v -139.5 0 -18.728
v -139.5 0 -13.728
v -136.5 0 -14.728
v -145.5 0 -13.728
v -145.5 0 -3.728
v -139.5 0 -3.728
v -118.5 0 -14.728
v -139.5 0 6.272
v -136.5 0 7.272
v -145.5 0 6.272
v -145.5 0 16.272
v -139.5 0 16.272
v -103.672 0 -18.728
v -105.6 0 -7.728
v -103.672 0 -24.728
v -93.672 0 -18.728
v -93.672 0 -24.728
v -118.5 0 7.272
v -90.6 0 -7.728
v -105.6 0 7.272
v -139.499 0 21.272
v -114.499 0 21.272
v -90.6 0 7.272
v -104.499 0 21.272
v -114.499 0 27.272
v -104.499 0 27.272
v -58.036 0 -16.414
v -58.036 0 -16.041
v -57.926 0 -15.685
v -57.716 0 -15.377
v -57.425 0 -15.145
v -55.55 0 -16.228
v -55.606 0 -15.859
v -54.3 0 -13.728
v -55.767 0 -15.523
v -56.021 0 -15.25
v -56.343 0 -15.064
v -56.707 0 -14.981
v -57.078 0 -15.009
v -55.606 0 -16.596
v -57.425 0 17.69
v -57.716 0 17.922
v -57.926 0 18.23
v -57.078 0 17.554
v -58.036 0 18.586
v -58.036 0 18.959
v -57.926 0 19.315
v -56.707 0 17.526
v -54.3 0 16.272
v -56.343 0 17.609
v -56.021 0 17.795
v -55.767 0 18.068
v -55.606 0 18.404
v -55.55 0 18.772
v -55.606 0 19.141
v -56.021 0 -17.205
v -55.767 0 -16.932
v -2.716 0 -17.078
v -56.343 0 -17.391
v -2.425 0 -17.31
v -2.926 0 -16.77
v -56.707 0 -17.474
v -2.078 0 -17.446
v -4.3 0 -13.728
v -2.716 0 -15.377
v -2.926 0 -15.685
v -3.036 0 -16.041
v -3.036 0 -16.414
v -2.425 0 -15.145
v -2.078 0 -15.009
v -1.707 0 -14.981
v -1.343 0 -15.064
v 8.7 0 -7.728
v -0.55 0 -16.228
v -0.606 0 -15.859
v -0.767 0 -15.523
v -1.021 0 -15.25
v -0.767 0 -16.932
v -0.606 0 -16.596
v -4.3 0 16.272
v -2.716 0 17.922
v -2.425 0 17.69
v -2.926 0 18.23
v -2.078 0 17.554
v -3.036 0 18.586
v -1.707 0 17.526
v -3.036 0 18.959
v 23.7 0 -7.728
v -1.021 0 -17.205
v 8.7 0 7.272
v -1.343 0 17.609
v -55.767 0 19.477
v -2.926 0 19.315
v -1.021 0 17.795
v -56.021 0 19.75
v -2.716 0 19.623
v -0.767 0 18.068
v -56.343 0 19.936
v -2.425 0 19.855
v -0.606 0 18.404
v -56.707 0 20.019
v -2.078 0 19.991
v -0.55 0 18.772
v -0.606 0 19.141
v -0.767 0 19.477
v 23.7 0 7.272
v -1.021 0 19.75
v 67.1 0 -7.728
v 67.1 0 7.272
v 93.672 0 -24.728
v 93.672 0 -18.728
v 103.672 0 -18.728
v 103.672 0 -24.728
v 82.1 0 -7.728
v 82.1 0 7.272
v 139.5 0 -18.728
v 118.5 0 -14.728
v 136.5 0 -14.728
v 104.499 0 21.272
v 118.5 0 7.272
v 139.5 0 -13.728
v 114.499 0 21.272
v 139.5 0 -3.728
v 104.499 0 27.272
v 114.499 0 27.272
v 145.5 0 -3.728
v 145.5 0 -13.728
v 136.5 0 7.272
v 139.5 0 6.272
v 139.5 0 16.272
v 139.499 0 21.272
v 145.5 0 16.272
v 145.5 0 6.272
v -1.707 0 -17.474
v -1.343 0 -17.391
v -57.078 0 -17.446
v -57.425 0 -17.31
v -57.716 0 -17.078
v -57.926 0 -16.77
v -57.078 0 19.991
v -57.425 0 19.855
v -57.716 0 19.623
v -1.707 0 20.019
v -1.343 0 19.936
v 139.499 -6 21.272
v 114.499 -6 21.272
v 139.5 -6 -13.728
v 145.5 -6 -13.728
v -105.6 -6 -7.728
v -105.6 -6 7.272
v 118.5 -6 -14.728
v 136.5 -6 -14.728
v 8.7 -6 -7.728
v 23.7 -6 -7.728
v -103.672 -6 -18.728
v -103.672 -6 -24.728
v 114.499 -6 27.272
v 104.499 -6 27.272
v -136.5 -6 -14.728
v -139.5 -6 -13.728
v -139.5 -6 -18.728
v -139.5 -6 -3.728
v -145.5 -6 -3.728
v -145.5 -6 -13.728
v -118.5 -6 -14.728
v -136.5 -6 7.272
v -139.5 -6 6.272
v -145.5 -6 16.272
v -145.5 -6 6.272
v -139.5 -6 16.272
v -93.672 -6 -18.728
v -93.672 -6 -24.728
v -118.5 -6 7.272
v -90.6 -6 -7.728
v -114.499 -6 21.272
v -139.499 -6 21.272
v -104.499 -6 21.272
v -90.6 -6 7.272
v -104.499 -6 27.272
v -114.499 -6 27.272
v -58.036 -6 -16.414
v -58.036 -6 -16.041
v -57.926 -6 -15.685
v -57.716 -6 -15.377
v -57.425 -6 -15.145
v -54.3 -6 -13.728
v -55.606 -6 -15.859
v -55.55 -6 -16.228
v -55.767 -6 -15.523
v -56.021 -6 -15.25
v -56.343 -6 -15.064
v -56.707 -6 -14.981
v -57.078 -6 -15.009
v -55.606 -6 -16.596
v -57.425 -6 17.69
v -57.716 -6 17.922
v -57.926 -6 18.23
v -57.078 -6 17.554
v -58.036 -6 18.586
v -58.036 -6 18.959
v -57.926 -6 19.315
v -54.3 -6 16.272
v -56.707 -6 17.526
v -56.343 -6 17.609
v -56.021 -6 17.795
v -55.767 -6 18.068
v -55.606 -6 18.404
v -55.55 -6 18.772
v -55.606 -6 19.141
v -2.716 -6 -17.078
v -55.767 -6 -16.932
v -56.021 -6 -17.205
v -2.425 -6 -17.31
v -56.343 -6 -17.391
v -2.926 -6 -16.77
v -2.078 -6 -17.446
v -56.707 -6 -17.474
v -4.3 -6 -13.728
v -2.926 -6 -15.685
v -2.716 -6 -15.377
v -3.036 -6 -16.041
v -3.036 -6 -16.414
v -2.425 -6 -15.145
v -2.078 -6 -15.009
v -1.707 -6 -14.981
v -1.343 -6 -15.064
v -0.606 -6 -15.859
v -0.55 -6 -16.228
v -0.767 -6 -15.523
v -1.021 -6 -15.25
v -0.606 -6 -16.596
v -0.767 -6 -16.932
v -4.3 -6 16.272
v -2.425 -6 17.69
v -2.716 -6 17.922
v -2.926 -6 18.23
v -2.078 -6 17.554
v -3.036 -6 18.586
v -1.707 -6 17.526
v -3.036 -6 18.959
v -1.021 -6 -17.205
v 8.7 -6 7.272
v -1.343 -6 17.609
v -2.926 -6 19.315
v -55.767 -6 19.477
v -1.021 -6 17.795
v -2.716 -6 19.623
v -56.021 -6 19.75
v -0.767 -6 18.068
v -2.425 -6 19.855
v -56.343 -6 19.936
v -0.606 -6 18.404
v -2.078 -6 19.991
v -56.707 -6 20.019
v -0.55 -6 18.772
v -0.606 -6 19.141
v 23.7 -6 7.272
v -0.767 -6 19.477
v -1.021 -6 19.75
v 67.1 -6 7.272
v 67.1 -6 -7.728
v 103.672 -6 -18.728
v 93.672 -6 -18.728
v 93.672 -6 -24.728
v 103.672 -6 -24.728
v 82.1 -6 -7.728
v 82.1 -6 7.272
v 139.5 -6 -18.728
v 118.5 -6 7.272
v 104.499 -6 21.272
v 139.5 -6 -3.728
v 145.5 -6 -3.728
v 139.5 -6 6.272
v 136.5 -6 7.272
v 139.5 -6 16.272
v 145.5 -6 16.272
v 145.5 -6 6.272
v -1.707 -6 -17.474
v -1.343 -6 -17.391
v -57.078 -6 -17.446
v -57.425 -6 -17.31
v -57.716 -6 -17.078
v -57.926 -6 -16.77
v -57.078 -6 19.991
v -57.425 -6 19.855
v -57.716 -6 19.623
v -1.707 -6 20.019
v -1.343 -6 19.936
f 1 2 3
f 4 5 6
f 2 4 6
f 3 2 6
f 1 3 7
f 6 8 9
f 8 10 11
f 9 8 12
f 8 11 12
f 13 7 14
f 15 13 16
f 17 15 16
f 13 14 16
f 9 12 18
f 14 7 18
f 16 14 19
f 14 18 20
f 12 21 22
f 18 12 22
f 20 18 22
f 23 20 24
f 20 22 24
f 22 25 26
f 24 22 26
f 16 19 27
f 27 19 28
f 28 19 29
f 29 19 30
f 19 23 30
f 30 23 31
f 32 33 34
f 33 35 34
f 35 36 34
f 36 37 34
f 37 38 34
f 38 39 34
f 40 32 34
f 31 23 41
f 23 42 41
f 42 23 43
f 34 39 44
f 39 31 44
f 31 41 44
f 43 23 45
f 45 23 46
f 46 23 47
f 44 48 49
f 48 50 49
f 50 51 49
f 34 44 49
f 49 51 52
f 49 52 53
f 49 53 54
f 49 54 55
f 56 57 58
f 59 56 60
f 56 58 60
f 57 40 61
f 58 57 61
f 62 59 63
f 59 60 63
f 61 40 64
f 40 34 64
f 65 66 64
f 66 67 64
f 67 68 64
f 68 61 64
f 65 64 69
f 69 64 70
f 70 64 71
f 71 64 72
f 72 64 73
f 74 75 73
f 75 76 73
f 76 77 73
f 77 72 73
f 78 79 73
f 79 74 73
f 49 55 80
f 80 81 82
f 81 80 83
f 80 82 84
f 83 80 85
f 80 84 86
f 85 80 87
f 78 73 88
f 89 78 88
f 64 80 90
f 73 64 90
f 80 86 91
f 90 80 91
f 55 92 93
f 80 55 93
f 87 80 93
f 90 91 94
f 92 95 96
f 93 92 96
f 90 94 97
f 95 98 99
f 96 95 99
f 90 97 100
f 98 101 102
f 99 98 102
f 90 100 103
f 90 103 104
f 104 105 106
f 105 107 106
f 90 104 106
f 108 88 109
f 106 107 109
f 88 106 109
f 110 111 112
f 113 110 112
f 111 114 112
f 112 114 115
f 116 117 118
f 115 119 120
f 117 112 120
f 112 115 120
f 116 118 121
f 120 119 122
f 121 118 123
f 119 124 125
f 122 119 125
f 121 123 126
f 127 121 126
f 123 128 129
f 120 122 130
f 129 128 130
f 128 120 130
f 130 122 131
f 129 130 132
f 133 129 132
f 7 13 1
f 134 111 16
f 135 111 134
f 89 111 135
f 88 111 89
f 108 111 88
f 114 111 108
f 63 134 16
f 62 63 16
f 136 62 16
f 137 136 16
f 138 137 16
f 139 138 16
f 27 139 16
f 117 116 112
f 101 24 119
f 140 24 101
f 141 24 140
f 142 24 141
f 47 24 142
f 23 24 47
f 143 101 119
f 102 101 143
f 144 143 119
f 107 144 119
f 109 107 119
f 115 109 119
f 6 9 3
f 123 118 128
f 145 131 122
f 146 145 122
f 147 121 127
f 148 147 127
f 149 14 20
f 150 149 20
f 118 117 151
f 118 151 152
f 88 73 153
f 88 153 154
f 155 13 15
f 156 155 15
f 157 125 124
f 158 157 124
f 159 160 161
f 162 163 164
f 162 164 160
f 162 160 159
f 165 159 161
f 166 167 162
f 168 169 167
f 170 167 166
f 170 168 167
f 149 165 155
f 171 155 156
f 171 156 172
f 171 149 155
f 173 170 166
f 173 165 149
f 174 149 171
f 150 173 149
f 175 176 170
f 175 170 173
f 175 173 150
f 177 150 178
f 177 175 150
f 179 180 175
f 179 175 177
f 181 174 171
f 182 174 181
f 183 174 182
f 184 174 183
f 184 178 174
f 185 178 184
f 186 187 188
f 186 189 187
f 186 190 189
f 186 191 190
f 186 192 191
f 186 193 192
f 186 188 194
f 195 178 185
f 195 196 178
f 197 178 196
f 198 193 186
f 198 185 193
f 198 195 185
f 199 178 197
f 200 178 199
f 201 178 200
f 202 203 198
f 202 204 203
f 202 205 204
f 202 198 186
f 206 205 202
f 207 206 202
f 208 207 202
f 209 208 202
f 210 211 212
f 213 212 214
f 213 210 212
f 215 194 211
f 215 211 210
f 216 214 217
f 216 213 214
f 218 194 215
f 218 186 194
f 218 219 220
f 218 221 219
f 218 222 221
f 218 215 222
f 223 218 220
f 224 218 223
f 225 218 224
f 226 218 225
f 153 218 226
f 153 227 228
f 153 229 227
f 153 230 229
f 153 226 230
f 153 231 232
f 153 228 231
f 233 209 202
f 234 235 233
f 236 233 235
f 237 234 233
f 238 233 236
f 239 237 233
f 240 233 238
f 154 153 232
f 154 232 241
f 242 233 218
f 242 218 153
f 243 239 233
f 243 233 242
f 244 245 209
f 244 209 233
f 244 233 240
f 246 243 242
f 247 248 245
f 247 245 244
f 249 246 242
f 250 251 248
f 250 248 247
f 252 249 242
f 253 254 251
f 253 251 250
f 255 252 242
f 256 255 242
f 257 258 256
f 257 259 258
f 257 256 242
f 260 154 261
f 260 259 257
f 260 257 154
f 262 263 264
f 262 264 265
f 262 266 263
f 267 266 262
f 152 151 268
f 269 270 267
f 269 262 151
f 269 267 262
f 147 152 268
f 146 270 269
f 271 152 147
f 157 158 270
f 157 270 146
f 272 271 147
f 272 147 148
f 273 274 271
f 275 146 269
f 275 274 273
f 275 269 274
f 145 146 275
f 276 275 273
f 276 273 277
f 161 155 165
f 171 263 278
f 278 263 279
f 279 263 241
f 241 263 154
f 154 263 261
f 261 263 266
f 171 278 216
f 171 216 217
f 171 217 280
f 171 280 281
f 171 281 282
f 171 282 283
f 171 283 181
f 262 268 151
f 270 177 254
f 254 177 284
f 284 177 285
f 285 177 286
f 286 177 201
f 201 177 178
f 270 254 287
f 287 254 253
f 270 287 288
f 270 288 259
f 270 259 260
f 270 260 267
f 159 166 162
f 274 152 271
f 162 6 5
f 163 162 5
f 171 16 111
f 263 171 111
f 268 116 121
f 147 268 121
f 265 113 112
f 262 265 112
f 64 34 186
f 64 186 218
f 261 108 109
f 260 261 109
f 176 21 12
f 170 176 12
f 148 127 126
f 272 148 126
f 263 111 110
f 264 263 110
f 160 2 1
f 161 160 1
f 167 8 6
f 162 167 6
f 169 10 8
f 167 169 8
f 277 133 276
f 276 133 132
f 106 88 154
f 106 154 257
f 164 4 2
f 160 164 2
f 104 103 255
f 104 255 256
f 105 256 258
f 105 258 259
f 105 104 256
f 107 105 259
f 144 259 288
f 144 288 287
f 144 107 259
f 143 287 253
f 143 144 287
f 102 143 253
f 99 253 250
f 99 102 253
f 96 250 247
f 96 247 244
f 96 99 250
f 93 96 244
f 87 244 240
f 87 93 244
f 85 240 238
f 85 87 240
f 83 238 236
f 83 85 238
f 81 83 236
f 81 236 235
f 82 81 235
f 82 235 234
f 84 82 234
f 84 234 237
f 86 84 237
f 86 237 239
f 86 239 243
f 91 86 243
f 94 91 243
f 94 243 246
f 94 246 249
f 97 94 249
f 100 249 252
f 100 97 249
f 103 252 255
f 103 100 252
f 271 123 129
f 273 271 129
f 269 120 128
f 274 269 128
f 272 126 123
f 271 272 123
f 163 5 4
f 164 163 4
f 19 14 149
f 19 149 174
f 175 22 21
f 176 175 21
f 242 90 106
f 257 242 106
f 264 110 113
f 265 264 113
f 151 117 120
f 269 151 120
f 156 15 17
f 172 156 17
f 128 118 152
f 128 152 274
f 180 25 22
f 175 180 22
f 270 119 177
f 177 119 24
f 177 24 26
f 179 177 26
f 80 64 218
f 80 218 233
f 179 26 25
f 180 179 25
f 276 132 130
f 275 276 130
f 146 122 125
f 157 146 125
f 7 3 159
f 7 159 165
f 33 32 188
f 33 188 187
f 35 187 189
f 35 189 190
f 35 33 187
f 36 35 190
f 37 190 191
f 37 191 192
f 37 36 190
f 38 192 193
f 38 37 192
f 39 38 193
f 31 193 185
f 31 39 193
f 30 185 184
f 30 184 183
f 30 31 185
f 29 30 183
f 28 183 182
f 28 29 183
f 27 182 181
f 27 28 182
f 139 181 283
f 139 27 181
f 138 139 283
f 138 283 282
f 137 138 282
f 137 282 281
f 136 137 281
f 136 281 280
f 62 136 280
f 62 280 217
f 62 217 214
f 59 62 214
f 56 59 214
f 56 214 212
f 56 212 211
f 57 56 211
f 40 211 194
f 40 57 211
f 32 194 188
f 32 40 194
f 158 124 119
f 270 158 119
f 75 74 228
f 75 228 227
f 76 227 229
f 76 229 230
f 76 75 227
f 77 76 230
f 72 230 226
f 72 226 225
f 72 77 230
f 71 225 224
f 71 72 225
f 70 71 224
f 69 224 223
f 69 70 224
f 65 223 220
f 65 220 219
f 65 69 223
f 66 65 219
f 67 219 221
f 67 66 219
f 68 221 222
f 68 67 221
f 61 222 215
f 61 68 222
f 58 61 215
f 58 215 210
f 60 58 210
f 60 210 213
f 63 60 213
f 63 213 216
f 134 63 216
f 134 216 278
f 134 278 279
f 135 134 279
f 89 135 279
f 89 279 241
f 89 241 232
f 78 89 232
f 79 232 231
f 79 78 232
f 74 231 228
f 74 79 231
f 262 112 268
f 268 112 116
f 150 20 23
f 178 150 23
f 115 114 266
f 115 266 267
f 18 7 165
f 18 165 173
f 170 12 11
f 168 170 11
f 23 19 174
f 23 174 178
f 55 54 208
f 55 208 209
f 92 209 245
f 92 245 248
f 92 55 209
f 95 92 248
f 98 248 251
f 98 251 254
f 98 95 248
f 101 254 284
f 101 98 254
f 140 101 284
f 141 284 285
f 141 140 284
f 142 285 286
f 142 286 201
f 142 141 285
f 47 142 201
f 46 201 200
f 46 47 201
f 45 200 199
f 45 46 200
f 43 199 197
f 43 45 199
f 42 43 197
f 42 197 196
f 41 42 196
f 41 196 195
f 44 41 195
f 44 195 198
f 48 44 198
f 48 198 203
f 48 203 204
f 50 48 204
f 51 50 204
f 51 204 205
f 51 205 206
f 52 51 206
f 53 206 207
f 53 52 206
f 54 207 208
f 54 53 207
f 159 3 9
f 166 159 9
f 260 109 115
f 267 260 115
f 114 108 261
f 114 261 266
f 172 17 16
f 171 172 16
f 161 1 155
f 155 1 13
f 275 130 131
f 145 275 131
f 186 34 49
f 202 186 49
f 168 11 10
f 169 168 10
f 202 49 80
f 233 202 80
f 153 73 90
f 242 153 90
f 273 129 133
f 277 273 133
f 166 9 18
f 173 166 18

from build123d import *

# Parameters (mm, degrees)
F0_R     = 1.25
F0_W     = 18
F0_H     = 22
F0_W_2   = 15
F0_H_2   = 15
F0_W_3   = 50
F0_H_3   = 30
F1_DEPTH = 6


with BuildPart() as f1:
    # F0 (on Front) → F1 (new body)
    with BuildSketch(Plane.XZ):
        Polygon((-139.5, -13.727578), (-139.5, -18.727578), (-103.67224, -18.727578), (-103.67224, -24.727578), (-93.67224, -24.727578), (-93.67224, -18.727578), (0, -18.727578), (93.67224, -18.727578), (93.67224, -24.727578), (103.67224, -24.727578), (103.67224, -18.727578), (139.5, -18.727578), (139.5, -13.727578), (145.5, -13.727578), (145.5, -3.727578), (139.5, -3.727578), (139.5, 6.272422), (145.5, 6.272422), (145.5, 16.272422), (139.499999, 16.272422), (139.49919, 21.272422), (114.49919, 21.272422), (114.49919, 27.272422), (104.49919, 27.272422), (104.49919, 21.272422), (0, 21.272422), (-104.49919, 21.272422), (-104.49919, 27.272422), (-114.49919, 27.272422), (-114.49919, 21.272422), (-139.49919, 21.272422), (-139.499999, 16.272422), (-145.5, 16.272422), (-145.5, 6.272422), (-139.5, 6.272422), (-139.5, -3.727578), (-145.5, -3.727578), (-145.5, -13.727578), align=None)
        with Locations((-56.8, -16.227578)):
            Circle(F0_R, mode=Mode.SUBTRACT)
        with Locations((-1.8, -16.227578)):
            Circle(F0_R, mode=Mode.SUBTRACT)
        with Locations((-127.5, -3.727578)):
            Rectangle(F0_W, F0_H, mode=Mode.SUBTRACT)
        with Locations((-98.1, -0.227578)):
            Rectangle(F0_W_2, F0_H_2, mode=Mode.SUBTRACT)
        with Locations((16.2, -0.227578)):
            Rectangle(F0_W_2, F0_H_2, mode=Mode.SUBTRACT)
        with Locations((74.6, -0.227578)):
            Rectangle(F0_W_2, F0_H_2, mode=Mode.SUBTRACT)
        with Locations((127.5, -3.727578)):
            Rectangle(F0_W, F0_H, mode=Mode.SUBTRACT)
        with Locations((-29.3, 1.272422)):
            Rectangle(F0_W_3, F0_H_3, mode=Mode.SUBTRACT)
        with Locations((-56.8, 18.772422)):
            Circle(F0_R, mode=Mode.SUBTRACT)
        with Locations((-1.8, 18.772422)):
            Circle(F0_R, mode=Mode.SUBTRACT)
    extrude(amount=F1_DEPTH)


solid = f1.part
